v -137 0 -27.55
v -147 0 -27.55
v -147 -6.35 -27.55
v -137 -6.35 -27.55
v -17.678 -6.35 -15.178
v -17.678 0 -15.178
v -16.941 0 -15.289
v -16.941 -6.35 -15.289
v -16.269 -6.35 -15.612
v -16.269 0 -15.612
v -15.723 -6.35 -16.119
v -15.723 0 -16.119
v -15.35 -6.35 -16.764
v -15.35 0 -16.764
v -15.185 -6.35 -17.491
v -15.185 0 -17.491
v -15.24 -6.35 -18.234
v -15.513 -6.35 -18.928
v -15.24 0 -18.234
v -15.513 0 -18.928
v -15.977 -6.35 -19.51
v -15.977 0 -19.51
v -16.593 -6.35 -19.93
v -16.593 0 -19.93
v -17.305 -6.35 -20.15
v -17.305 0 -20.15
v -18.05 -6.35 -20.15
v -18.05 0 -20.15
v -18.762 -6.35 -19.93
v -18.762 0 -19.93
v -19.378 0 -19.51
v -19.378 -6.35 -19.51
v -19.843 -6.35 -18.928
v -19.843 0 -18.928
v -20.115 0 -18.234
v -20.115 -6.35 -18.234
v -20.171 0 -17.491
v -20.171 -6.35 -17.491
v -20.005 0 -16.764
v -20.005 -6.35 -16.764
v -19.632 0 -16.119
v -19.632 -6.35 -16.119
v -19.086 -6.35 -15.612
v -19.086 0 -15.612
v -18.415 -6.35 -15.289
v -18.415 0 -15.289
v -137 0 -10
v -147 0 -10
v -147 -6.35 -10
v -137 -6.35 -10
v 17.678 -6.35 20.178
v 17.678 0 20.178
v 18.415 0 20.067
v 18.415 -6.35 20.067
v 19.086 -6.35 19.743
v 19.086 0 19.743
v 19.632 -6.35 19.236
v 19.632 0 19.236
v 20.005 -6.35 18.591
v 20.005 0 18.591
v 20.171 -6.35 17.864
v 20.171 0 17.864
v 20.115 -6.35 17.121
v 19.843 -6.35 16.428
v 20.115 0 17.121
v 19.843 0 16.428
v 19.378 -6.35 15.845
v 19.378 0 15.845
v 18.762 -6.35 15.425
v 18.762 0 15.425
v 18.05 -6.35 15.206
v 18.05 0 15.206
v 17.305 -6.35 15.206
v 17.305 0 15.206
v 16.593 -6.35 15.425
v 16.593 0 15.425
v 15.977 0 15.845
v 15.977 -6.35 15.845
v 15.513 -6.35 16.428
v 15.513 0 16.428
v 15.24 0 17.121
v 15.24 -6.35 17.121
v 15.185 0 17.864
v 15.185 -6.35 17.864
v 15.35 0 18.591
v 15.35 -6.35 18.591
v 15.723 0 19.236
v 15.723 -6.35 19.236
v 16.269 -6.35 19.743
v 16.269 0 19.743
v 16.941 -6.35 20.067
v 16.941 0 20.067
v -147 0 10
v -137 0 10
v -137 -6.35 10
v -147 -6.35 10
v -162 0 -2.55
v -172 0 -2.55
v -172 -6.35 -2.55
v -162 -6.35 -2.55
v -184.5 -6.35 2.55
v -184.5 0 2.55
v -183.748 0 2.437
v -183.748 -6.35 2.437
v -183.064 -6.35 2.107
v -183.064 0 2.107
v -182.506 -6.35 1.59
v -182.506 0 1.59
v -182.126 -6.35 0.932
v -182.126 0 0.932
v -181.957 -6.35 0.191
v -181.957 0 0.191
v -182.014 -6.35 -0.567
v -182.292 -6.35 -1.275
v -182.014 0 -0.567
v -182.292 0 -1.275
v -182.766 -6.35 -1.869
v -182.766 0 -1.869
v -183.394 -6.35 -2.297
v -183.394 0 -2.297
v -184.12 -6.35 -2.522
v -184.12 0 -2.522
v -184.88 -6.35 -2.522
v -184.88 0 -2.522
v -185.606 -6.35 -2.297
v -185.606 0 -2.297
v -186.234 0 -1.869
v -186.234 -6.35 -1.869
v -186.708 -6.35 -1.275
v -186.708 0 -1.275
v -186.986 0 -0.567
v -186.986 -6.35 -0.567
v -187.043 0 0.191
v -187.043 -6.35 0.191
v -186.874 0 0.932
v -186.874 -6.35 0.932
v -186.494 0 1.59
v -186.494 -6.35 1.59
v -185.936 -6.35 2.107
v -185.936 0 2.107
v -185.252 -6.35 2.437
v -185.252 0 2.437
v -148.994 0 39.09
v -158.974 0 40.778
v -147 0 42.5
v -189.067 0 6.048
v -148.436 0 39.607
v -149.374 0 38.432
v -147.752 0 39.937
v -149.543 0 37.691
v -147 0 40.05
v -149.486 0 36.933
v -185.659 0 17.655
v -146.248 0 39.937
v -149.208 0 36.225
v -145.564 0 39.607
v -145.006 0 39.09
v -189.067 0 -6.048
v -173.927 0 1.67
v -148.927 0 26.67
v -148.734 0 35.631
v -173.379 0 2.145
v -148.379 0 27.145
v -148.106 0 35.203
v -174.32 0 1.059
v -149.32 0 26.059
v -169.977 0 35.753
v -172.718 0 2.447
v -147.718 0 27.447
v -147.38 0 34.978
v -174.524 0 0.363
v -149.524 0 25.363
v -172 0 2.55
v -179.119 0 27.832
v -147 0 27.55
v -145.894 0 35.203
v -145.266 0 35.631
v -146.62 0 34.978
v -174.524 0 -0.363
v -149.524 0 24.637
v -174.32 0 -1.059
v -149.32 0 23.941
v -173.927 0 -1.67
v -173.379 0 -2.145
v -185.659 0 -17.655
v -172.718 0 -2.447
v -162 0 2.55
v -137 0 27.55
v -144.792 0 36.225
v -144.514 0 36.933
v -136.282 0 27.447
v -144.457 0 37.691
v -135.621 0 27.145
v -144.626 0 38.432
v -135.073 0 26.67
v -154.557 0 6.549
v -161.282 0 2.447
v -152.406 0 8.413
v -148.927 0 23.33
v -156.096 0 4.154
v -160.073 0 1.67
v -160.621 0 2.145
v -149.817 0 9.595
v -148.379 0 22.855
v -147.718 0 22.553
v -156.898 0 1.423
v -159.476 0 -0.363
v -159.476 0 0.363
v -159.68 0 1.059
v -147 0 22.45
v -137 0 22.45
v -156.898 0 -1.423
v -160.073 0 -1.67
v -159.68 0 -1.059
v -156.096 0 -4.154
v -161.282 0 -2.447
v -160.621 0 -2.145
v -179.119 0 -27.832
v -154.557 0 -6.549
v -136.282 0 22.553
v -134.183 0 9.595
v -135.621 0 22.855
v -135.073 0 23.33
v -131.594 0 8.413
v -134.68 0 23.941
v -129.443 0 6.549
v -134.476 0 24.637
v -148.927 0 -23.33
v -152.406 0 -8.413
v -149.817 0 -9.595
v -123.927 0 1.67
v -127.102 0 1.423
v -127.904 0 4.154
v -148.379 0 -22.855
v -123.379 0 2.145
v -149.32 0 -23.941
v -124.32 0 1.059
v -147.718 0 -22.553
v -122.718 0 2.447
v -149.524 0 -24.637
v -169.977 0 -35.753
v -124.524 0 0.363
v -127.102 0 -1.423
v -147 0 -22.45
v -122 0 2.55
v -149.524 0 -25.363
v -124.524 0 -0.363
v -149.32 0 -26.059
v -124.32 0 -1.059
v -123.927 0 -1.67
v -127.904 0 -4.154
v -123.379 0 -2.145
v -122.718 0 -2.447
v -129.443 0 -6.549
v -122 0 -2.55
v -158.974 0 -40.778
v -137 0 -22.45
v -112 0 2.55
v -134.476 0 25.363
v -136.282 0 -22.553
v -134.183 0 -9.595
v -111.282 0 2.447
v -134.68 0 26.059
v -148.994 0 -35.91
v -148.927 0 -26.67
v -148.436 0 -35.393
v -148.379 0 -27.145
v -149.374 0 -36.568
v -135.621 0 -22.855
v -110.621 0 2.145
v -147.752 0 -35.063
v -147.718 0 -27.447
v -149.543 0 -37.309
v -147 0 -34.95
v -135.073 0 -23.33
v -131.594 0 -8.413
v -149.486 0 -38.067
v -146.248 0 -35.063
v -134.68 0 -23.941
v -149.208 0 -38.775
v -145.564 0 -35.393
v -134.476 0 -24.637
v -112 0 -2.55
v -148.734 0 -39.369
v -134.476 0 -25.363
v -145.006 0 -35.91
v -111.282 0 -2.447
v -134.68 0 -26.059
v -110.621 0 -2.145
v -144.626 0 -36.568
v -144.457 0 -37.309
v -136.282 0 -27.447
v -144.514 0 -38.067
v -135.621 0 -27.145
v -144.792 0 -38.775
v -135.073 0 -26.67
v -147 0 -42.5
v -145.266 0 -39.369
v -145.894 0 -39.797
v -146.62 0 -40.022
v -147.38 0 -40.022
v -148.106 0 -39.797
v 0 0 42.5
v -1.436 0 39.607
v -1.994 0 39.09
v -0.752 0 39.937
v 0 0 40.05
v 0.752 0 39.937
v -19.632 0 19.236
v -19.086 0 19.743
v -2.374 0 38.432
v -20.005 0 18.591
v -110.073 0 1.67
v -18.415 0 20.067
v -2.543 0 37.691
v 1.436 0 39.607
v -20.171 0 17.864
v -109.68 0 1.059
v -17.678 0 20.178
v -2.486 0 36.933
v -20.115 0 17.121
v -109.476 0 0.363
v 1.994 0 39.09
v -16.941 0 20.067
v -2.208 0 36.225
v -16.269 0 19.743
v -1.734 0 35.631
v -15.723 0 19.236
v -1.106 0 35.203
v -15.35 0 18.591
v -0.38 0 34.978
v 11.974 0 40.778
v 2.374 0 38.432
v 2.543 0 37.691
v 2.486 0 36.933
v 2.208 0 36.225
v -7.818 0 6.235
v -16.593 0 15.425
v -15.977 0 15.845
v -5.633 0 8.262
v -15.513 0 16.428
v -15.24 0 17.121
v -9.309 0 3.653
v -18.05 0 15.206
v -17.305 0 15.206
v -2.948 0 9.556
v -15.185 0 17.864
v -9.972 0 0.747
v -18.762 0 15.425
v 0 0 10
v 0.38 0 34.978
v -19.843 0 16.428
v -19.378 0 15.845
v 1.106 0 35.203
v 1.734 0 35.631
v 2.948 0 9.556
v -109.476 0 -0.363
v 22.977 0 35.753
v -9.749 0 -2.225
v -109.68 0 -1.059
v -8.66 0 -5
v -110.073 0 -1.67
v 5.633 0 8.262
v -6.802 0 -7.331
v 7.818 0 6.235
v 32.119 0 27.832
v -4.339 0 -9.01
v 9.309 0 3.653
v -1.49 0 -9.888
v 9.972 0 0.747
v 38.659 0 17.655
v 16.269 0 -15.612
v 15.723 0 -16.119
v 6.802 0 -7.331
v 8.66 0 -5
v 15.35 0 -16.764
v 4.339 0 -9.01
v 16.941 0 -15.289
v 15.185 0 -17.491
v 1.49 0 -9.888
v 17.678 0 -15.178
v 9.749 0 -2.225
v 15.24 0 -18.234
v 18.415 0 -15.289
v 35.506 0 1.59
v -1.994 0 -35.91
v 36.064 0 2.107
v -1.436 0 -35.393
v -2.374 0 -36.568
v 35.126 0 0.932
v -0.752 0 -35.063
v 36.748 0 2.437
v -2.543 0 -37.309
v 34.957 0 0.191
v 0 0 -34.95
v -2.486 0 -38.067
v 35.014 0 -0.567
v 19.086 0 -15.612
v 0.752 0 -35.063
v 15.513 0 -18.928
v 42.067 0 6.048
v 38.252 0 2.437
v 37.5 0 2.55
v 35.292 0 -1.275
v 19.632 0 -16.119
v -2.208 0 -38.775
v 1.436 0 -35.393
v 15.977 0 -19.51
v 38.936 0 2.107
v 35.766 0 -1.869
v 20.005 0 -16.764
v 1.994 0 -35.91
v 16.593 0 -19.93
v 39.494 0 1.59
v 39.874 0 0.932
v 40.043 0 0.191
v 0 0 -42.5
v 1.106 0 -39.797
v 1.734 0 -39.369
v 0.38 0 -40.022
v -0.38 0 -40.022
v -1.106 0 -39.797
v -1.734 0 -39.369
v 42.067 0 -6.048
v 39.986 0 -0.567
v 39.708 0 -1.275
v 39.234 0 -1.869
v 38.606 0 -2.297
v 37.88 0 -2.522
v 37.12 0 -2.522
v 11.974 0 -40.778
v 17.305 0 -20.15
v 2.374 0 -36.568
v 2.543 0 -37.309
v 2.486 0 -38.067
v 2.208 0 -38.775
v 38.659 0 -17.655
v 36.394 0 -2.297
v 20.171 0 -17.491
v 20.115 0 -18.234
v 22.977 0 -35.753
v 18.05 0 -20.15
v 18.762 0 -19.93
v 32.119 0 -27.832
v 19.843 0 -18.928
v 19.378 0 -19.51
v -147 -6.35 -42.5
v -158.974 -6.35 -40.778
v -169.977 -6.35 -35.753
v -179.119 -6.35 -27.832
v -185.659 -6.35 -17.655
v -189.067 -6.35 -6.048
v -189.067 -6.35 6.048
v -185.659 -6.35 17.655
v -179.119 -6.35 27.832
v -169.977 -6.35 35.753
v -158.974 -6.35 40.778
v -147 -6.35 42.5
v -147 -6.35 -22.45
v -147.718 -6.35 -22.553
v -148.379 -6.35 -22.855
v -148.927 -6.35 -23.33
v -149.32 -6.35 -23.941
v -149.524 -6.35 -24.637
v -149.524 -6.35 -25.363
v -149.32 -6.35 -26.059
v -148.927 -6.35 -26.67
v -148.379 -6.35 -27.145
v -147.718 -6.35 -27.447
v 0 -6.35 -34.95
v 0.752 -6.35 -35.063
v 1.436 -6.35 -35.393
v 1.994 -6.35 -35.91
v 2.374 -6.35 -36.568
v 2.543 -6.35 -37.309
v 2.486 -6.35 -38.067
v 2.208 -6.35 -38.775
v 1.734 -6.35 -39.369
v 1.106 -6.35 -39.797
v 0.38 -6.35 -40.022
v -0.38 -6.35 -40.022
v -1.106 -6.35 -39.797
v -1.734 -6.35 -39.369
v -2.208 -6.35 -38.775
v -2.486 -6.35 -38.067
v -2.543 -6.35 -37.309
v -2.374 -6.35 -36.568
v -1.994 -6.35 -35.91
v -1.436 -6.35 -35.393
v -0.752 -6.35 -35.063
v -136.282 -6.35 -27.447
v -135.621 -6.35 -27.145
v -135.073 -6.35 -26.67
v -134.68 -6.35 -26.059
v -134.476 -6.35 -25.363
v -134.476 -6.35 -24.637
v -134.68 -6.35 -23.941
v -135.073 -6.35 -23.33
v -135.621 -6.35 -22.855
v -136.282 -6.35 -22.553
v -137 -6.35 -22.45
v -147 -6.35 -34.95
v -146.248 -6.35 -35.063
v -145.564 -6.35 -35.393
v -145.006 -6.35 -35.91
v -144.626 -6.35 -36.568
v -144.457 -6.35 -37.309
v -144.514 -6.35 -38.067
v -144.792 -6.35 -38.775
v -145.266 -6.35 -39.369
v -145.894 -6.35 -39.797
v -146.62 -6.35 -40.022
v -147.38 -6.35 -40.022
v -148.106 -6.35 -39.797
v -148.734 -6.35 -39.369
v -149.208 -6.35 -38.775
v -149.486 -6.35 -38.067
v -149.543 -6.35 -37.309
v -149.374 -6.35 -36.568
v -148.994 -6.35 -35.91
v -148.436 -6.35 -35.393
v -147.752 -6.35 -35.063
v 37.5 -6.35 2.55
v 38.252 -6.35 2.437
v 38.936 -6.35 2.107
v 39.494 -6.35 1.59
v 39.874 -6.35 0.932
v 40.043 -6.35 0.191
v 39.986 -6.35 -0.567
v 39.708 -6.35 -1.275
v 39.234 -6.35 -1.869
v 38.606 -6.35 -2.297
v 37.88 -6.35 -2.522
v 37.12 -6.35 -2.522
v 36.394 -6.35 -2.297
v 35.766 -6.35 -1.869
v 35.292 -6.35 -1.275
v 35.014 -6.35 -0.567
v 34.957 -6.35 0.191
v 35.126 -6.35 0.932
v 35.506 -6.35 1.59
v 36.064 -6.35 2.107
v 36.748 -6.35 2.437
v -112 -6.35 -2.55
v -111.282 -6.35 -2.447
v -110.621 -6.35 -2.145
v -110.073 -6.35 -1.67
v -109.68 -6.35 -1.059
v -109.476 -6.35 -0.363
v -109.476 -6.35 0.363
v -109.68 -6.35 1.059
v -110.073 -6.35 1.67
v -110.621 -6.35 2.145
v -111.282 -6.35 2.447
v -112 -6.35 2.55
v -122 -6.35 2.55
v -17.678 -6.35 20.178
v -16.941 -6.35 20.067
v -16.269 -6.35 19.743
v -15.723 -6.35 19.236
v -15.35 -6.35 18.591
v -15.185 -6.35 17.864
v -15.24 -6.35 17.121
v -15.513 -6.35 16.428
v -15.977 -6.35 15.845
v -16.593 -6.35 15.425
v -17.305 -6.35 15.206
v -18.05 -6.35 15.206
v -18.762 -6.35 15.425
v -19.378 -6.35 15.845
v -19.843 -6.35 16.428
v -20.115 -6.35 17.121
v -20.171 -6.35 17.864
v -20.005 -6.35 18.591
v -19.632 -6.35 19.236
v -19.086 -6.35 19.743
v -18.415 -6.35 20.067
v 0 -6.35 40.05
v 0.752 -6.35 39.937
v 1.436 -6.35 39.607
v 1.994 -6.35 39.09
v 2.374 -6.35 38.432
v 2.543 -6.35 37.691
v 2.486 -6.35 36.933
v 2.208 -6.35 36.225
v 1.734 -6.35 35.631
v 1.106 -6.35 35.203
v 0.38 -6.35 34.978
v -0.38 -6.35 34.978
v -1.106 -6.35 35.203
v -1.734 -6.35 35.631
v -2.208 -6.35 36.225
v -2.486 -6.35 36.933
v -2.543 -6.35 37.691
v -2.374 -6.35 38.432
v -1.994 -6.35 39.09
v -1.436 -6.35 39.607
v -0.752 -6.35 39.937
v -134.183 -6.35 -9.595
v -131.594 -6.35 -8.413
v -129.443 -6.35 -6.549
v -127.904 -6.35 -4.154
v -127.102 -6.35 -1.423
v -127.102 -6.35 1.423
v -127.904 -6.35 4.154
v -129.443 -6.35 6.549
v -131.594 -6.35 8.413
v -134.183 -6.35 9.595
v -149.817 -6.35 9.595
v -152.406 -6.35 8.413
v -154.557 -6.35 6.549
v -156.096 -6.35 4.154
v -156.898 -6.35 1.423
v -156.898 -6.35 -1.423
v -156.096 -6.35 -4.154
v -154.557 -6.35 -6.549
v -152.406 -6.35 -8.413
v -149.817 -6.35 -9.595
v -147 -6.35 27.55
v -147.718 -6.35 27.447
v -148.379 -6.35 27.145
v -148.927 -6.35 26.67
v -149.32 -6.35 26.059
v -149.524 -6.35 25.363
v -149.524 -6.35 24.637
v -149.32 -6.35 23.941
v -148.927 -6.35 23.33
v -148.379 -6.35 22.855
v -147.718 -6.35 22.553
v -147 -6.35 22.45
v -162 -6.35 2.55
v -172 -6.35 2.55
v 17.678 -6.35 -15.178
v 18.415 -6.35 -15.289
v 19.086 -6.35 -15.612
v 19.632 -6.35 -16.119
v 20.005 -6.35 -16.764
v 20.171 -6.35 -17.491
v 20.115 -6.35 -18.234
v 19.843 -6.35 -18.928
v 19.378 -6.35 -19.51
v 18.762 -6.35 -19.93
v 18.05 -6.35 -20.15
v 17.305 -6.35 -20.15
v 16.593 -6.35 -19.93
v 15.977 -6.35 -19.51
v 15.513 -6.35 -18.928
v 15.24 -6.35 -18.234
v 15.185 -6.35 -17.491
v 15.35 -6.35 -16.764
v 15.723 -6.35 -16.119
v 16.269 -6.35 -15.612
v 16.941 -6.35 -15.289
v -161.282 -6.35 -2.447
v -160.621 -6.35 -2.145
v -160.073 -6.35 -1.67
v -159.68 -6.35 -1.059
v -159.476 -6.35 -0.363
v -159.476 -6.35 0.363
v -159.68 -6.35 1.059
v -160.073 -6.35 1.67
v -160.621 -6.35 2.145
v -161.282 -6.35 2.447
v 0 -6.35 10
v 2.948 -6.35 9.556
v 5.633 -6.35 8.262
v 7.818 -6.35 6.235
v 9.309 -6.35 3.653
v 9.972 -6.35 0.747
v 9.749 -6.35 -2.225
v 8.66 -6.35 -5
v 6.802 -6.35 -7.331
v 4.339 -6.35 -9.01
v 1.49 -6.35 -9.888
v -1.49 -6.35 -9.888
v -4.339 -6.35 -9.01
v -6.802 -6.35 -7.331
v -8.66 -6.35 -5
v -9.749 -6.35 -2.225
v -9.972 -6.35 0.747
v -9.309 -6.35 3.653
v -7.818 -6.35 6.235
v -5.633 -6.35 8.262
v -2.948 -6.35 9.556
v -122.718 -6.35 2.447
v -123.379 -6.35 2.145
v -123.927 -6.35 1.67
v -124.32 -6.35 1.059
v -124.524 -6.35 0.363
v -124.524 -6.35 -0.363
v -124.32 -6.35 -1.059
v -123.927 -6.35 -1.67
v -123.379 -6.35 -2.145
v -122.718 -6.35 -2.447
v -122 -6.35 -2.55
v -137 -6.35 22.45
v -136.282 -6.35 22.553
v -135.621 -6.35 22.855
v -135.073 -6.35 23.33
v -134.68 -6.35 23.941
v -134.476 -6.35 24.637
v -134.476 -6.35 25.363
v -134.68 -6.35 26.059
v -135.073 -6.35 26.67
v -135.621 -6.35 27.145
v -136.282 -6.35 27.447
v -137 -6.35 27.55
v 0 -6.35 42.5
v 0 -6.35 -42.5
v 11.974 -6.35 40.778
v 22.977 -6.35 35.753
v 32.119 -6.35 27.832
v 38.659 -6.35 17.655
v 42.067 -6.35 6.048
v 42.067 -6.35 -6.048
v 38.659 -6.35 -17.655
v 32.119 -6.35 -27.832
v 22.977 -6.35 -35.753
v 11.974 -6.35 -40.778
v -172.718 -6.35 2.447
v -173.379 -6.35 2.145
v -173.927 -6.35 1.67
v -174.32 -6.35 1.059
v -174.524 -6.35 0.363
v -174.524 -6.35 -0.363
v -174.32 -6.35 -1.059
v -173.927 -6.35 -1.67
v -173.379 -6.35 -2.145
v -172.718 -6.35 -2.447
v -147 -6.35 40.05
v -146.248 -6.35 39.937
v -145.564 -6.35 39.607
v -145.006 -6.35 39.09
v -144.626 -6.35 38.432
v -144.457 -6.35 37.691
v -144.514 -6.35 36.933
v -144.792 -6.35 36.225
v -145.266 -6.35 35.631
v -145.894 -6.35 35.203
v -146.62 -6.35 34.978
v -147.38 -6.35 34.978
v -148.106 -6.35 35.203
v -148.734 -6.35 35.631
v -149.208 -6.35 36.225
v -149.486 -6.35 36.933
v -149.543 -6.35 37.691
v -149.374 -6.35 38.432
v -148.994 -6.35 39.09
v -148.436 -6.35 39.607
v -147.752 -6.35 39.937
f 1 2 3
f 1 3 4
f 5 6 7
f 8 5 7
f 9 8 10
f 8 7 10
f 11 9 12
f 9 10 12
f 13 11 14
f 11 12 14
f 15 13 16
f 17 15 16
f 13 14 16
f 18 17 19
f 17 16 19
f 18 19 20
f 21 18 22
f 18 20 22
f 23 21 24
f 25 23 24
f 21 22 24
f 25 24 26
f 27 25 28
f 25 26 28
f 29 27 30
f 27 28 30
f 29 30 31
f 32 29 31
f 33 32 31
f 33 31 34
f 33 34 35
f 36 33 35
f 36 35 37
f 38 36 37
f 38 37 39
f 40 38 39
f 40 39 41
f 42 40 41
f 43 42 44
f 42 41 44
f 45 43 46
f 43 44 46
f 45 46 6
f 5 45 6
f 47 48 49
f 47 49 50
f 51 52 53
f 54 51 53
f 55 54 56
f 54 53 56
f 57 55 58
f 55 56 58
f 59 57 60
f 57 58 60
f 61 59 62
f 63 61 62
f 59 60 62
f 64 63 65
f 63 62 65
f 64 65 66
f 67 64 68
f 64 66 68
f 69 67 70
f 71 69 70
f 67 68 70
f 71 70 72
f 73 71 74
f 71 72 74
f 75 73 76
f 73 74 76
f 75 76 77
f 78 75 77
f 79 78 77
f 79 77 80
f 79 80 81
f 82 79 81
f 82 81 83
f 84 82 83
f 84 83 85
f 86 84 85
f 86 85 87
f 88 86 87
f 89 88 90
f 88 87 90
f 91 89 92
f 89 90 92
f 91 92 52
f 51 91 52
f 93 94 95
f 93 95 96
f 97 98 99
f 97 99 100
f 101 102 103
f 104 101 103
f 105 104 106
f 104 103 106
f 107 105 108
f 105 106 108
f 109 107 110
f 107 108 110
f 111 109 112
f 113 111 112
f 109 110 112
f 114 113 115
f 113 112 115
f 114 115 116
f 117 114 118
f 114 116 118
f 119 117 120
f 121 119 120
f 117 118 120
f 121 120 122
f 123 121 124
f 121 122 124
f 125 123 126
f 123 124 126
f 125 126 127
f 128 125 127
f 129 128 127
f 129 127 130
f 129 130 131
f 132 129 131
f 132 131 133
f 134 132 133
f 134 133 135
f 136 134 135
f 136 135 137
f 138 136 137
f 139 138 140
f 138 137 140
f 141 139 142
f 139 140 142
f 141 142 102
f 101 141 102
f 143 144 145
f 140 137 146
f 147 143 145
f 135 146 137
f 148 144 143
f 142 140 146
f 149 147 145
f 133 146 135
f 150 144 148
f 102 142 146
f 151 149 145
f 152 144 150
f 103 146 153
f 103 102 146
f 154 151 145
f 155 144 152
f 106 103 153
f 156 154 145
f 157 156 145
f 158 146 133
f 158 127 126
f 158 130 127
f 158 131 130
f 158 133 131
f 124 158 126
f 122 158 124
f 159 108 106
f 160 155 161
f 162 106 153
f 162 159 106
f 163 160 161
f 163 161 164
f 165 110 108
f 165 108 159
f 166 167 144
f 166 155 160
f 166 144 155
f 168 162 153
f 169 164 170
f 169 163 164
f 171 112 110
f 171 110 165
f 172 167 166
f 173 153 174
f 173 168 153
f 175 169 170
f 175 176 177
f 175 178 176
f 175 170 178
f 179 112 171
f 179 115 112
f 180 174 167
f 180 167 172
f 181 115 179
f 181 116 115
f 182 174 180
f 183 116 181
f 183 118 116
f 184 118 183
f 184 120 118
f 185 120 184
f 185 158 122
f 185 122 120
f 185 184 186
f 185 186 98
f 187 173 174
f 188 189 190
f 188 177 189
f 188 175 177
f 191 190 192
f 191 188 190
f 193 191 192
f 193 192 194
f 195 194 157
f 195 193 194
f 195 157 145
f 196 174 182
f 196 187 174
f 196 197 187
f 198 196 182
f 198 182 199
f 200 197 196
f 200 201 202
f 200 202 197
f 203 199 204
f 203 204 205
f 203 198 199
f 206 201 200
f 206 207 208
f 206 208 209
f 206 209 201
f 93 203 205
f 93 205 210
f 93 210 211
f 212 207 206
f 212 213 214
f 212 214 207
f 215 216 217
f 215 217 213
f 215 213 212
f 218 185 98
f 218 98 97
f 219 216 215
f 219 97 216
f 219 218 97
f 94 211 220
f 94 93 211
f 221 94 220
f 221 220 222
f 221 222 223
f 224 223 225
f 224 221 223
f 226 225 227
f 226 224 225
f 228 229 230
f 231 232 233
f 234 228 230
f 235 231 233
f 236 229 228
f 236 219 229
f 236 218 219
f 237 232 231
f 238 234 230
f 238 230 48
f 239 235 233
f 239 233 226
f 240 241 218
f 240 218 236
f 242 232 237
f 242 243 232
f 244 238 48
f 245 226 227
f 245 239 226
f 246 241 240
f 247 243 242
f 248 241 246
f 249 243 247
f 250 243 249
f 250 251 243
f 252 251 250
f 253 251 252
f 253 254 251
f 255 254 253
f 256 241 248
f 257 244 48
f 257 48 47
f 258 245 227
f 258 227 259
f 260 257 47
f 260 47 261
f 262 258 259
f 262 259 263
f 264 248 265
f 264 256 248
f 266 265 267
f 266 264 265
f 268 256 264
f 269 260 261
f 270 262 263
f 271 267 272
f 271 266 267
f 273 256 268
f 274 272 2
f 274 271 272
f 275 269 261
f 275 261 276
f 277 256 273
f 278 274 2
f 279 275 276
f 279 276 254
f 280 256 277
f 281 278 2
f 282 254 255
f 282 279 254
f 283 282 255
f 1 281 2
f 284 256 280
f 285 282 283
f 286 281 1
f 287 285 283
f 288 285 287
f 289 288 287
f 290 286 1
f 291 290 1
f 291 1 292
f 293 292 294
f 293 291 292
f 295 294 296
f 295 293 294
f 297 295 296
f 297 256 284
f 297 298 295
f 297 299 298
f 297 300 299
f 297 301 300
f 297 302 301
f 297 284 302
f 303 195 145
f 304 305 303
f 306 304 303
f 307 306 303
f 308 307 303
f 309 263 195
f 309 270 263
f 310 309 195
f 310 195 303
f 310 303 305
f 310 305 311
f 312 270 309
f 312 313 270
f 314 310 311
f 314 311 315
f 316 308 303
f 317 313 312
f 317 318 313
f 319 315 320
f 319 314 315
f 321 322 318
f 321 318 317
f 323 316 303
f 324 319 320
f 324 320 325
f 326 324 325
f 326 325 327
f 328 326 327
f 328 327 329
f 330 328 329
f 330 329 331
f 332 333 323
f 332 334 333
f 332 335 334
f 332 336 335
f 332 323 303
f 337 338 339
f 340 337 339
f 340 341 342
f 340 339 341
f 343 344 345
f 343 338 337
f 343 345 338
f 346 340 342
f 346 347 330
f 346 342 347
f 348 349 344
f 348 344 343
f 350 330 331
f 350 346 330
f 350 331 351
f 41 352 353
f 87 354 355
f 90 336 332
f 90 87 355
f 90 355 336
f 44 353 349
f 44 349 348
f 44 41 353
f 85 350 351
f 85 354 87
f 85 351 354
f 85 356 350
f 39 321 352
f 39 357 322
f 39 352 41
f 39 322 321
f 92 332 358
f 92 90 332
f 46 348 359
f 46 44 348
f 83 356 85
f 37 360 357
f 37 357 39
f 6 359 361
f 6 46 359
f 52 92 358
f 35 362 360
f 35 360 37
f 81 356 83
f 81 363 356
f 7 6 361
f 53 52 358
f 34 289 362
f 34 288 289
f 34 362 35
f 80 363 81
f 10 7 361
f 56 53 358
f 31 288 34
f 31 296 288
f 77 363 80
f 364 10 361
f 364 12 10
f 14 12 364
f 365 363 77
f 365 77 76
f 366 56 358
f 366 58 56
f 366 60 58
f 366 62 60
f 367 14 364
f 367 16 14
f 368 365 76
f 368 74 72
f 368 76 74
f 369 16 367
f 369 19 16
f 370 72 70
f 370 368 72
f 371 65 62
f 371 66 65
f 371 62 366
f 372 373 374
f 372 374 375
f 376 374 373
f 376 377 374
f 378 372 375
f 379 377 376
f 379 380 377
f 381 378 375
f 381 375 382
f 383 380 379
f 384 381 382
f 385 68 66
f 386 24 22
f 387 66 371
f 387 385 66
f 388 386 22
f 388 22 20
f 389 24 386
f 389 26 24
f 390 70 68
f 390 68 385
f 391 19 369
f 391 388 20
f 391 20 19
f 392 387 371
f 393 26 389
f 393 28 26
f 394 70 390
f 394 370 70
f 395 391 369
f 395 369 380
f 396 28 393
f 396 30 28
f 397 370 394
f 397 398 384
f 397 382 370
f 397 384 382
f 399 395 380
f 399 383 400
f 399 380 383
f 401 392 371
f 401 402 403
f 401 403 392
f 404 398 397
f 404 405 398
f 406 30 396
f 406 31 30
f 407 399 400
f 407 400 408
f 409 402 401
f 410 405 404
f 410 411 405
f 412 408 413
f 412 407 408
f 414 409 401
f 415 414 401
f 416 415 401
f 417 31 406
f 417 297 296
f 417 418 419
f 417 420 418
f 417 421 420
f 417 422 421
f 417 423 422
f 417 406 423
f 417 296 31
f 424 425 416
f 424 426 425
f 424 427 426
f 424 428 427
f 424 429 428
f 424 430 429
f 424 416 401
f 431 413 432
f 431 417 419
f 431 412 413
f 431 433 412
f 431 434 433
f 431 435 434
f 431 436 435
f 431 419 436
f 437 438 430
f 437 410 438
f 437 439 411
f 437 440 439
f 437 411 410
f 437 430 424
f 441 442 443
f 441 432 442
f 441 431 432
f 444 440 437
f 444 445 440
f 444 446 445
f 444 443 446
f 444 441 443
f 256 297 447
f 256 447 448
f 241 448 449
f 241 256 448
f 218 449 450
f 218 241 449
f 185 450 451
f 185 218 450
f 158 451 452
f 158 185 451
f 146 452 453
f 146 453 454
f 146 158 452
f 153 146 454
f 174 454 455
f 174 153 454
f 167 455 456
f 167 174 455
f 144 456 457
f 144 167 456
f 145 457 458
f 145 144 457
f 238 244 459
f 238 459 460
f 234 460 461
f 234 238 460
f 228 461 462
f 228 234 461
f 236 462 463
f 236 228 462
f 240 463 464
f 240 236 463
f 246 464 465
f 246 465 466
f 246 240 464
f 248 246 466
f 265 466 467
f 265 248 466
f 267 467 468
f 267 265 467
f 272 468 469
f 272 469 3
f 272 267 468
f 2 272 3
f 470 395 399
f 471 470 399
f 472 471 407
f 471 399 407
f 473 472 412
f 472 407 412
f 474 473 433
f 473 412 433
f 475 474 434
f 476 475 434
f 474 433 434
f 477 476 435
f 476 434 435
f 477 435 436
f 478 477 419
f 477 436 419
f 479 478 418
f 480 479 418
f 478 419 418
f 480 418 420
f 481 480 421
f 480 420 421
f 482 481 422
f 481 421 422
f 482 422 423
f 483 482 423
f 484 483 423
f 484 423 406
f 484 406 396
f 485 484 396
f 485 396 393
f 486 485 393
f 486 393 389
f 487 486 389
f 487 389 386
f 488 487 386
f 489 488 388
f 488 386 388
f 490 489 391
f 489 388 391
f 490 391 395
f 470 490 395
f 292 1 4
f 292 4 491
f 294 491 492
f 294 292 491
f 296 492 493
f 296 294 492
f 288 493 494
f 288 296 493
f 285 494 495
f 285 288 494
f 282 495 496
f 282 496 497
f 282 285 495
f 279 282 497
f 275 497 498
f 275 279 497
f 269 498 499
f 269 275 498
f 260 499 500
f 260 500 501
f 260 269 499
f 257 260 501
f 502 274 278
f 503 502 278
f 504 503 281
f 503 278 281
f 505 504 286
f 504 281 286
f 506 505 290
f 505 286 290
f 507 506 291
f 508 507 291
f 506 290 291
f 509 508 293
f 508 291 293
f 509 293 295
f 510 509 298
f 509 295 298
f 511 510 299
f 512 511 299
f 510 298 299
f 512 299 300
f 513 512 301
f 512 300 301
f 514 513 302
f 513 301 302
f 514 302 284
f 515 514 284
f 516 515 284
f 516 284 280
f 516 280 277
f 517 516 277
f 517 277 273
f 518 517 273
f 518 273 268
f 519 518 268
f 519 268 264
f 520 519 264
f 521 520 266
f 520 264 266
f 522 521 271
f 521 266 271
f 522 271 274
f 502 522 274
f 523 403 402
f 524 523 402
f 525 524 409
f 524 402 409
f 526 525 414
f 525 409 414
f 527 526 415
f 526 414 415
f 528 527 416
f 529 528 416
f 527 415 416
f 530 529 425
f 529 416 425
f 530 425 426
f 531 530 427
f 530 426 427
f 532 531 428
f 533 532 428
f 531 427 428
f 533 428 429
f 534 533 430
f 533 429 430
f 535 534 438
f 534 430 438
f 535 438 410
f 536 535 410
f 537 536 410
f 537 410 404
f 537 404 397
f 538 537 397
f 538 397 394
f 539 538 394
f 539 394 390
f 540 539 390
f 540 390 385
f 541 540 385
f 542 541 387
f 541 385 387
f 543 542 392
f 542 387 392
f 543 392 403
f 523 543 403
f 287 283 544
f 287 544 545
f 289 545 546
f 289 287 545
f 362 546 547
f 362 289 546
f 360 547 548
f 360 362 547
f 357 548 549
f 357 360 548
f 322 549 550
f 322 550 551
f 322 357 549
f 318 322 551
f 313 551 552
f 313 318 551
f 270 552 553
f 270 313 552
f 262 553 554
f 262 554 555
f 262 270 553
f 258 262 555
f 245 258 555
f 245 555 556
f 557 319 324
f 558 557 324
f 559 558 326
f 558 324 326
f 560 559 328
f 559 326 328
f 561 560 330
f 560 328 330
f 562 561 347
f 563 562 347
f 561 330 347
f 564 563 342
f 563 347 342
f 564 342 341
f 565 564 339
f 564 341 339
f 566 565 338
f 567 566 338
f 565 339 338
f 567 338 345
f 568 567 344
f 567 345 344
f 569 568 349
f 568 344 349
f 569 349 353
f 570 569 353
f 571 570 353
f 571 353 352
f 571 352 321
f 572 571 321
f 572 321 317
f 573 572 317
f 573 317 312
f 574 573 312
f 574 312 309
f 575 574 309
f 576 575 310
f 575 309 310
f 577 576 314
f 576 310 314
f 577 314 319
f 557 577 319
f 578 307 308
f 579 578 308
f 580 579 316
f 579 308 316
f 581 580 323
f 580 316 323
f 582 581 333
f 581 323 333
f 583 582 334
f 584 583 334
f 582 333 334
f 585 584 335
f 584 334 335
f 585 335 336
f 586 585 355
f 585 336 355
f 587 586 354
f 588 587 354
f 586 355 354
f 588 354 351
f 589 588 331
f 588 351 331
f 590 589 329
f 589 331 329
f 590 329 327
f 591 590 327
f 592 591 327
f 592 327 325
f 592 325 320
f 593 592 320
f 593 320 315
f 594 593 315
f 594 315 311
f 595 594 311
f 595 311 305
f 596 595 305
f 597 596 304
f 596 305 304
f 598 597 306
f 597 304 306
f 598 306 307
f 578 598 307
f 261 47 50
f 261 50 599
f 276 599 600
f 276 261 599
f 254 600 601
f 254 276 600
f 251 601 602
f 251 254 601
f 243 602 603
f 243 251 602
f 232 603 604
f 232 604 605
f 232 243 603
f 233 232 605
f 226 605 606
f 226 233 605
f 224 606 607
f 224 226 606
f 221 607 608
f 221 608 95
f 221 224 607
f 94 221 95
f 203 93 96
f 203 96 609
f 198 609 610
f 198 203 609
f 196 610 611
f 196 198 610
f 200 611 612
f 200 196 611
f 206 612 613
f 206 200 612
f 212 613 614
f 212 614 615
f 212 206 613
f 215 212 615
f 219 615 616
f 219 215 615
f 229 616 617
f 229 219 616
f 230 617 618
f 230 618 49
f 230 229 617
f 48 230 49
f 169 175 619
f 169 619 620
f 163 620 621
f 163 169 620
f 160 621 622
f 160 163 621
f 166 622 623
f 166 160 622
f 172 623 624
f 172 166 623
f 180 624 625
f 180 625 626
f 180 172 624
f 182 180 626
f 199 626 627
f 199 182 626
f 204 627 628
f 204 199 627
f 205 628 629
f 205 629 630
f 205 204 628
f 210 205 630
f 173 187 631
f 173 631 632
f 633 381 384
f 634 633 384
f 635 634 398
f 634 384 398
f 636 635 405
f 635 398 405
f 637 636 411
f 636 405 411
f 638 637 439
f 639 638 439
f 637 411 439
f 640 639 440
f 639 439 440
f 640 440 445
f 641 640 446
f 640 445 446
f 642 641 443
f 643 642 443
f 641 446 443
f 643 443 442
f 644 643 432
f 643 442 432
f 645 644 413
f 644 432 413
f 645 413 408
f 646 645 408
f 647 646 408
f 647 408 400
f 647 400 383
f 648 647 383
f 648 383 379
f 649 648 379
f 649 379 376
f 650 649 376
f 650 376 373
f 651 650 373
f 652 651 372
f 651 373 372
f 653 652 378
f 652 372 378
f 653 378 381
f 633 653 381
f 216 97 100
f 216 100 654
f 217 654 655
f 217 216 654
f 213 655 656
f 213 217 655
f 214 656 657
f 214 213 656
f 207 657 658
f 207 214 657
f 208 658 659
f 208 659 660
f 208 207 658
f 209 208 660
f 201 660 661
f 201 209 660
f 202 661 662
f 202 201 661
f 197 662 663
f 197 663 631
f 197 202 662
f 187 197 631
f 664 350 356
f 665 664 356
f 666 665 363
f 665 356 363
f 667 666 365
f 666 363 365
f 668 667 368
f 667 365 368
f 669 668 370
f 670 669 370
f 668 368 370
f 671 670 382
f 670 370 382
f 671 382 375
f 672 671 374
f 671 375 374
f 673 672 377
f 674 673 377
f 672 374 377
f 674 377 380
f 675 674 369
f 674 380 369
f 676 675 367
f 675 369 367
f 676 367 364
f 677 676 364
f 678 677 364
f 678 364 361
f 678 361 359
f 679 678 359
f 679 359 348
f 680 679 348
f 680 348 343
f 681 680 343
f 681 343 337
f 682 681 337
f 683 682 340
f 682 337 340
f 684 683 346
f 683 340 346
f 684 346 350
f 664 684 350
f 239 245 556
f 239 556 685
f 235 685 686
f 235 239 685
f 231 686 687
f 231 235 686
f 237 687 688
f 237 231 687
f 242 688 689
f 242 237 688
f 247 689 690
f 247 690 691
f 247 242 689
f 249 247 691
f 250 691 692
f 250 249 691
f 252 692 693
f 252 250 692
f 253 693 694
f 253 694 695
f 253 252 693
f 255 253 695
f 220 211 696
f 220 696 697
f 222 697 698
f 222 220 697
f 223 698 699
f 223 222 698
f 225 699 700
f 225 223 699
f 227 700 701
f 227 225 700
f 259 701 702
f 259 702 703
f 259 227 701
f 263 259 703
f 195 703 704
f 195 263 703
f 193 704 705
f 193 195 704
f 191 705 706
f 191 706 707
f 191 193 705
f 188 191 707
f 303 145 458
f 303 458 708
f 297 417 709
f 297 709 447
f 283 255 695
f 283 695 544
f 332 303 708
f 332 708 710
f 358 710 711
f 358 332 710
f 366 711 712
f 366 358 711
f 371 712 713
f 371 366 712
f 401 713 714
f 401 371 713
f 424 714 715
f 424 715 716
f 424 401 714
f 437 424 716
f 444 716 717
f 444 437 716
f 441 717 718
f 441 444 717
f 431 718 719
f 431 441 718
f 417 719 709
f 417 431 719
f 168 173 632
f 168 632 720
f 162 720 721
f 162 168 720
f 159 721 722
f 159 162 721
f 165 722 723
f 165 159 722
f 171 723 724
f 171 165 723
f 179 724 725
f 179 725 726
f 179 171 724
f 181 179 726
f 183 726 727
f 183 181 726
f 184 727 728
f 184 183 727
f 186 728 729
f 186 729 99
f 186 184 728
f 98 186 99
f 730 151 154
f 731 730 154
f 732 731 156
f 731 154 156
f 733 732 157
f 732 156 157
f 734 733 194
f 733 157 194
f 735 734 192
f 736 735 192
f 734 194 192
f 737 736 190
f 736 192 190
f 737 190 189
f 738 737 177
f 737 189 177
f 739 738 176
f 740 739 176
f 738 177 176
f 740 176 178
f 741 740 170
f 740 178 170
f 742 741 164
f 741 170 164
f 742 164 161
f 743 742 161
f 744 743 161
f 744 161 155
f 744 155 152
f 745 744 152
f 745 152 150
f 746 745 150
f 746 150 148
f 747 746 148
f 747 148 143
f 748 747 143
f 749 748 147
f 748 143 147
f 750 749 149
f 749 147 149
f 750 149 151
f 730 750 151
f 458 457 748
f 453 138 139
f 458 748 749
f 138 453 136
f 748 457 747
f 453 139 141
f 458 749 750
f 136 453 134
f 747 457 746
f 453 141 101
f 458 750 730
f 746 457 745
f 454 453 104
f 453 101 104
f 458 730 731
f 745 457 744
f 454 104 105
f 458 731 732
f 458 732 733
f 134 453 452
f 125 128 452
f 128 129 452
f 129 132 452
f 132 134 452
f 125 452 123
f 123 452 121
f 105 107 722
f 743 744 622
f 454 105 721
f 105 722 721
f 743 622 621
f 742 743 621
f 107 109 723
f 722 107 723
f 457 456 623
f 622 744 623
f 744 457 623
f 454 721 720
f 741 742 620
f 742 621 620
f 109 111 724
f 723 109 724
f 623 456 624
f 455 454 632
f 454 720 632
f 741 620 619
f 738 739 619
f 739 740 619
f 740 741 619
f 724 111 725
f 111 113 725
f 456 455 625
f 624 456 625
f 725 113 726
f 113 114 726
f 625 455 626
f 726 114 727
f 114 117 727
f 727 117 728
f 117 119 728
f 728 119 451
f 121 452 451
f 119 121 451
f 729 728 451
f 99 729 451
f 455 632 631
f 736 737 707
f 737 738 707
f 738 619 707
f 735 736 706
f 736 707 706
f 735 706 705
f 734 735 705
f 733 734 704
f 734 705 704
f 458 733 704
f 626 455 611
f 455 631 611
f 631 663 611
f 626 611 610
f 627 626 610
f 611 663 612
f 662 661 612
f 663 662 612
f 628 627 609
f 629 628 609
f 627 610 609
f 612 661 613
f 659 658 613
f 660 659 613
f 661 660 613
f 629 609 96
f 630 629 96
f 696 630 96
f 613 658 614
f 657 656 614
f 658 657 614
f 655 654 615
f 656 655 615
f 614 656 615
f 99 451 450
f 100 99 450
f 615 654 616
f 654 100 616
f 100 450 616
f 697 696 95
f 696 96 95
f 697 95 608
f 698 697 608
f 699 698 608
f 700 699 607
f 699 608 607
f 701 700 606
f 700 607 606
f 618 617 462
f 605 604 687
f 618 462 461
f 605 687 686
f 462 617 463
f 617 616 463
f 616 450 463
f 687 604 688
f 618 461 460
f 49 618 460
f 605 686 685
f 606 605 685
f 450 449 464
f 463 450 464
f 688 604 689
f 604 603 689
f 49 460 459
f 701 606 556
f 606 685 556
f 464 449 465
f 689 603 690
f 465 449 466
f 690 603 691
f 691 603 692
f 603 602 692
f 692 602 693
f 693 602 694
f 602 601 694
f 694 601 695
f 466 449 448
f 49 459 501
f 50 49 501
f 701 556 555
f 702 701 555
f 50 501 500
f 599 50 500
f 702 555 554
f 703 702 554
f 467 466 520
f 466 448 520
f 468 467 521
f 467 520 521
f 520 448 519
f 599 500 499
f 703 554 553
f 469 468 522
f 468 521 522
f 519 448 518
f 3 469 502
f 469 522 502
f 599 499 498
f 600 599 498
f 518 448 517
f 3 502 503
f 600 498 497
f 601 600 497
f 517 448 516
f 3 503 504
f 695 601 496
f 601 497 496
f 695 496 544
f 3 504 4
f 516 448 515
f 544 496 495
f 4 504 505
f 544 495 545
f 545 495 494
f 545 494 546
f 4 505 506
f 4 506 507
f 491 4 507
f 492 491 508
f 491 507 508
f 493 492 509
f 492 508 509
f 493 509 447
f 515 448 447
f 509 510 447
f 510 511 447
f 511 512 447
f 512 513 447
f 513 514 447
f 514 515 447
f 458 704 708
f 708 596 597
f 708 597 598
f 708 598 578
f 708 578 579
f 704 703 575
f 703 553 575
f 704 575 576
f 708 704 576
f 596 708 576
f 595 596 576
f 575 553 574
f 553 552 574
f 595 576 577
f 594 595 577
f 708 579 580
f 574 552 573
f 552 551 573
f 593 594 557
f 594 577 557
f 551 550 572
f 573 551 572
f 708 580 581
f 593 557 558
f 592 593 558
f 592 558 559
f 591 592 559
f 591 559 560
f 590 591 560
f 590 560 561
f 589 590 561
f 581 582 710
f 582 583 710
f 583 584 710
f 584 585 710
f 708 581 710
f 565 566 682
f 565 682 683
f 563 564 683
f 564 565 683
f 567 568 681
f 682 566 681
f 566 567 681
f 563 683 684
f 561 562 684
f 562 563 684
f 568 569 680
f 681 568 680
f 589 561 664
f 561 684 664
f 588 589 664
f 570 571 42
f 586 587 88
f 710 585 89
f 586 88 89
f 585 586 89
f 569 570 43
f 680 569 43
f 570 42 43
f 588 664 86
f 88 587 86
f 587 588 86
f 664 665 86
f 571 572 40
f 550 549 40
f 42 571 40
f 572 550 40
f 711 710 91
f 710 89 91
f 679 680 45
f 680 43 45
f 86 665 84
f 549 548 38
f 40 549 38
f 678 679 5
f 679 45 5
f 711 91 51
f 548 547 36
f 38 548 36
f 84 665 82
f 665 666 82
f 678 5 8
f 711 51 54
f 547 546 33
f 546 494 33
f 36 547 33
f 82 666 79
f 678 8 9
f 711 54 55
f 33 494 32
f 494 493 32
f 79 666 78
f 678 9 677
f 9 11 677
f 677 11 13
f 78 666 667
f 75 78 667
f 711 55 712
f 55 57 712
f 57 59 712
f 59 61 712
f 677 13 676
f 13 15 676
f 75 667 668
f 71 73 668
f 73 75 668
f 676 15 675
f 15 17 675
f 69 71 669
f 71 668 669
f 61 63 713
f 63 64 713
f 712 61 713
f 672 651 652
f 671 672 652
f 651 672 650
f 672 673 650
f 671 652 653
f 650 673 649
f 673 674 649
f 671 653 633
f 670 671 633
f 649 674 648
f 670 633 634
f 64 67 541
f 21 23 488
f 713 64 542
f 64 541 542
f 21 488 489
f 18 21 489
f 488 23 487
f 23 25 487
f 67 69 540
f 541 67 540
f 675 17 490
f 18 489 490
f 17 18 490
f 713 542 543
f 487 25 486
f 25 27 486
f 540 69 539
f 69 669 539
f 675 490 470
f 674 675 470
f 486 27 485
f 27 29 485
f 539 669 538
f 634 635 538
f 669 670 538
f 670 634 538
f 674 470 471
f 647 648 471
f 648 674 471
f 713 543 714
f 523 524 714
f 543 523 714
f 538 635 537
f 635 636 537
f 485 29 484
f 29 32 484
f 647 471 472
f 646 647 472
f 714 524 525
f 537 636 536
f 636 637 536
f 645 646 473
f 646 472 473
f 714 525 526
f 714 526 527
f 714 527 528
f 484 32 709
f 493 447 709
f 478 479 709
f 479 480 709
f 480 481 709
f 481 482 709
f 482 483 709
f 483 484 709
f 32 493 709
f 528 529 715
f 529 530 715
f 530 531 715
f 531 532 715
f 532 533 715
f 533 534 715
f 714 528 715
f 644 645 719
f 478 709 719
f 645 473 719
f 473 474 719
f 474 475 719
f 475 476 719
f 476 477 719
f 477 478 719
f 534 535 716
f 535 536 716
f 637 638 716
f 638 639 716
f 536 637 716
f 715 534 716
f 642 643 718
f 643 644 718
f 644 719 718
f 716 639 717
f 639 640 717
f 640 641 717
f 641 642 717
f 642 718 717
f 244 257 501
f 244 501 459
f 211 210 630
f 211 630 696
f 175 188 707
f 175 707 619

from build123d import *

# Parameters (mm, degrees)
SKETCH1_R           = 2.55
SKETCH1_R_2         = 2.5
SKETCH1_R_3         = 10
BOSS_EXTRUDE1_DEPTH = 6.35


with BuildPart() as part:
    # Sketch1 → Boss-Extrude1 (new body)
    with BuildSketch(Plane(origin=(0, 0, 0), x_dir=(1, 0, 0), z_dir=(0, 1, 0))):
        with BuildLine():
            Line((0, 42.5), (-147, 42.5))
            ThreePointArc((-147, 42.5), (-189.5, 0), (-147, -42.5))
            Line((-147, -42.5), (0, -42.5))
            ThreePointArc((0, -42.5), (42.5, 0), (0, 42.5))
        make_face()
        with BuildLine():
            Line((-147, 27.55), (-137, 27.55))
            ThreePointArc((-137, 27.55), (-134.45, 25), (-137, 22.45))
            Line((-137, 22.45), (-147, 22.45))
            ThreePointArc((-147, 22.45), (-149.55, 25), (-147, 27.55))
        make_face(mode=Mode.SUBTRACT)
        with Locations(Location((-147, 37.5, 0), (0, 0, 270))):
            Circle(SKETCH1_R, mode=Mode.SUBTRACT)
        with Locations(Location((-147, -37.5, 0), (0, 0, 270))):
            Circle(SKETCH1_R, mode=Mode.SUBTRACT)
        with BuildLine():
            ThreePointArc((-147, -27.55), (-149.55, -25), (-147, -22.45))
            Line((-147, -22.45), (-137, -22.45))
            ThreePointArc((-137, -22.45), (-134.45, -25), (-137, -27.55))
            Line((-137, -27.55), (-147, -27.55))
        make_face(mode=Mode.SUBTRACT)
        with Locations(Location((-184.5, 0, 0), (0, 0, 270))):
            Circle(SKETCH1_R, mode=Mode.SUBTRACT)
        with BuildLine():
            ThreePointArc((-172, -2.55), (-174.55, 0), (-172, 2.55))
            Line((-172, 2.55), (-162, 2.55))
            ThreePointArc((-162, 2.55), (-159.45, 0), (-162, -2.55))
            Line((-162, -2.55), (-172, -2.55))
        make_face(mode=Mode.SUBTRACT)
        with BuildLine():
            ThreePointArc((-147, -10), (-157, 0), (-147, 10))
            Line((-147, 10), (-137, 10))
            ThreePointArc((-137, 10), (-127, 0), (-137, -10))
            Line((-137, -10), (-147, -10))
        make_face(mode=Mode.SUBTRACT)
        with BuildLine():
            ThreePointArc((-122, -2.55), (-124.55, 0), (-122, 2.55))
            Line((-122, 2.55), (-112, 2.55))
            ThreePointArc((-112, 2.55), (-109.45, 0), (-112, -2.55))
            Line((-112, -2.55), (-122, -2.55))
        make_face(mode=Mode.SUBTRACT)
        with Locations(Location((0, 37.5, 0), (0, 0, 270))):
            Circle(SKETCH1_R, mode=Mode.SUBTRACT)
        with Locations(Location((0, -37.5, 0), (0, 0, 270))):
            Circle(SKETCH1_R, mode=Mode.SUBTRACT)
        with Locations(Location((-17.67766953, -17.67766953, 0), (0, 0, 270))):
            Circle(SKETCH1_R_2, mode=Mode.SUBTRACT)
        with Locations(Location((17.67766953, -17.67766953, 0), (0, 0, 270))):
            Circle(SKETCH1_R_2, mode=Mode.SUBTRACT)
        with Locations(Location((-17.67766953, 17.67766953, 0), (0, 0, 270))):
            Circle(SKETCH1_R_2, mode=Mode.SUBTRACT)
        with Locations(Location((0, 0, 0), (0, 0, 270))):
            Circle(SKETCH1_R_3, mode=Mode.SUBTRACT)
        with Locations(Location((37.5, 0, 0), (0, 0, 270))):
            Circle(SKETCH1_R, mode=Mode.SUBTRACT)
        with Locations(Location((17.67766953, 17.67766953, 0), (0, 0, 270))):
            Circle(SKETCH1_R_2, mode=Mode.SUBTRACT)
    extrude(amount=-BOSS_EXTRUDE1_DEPTH)


solid = part.part
